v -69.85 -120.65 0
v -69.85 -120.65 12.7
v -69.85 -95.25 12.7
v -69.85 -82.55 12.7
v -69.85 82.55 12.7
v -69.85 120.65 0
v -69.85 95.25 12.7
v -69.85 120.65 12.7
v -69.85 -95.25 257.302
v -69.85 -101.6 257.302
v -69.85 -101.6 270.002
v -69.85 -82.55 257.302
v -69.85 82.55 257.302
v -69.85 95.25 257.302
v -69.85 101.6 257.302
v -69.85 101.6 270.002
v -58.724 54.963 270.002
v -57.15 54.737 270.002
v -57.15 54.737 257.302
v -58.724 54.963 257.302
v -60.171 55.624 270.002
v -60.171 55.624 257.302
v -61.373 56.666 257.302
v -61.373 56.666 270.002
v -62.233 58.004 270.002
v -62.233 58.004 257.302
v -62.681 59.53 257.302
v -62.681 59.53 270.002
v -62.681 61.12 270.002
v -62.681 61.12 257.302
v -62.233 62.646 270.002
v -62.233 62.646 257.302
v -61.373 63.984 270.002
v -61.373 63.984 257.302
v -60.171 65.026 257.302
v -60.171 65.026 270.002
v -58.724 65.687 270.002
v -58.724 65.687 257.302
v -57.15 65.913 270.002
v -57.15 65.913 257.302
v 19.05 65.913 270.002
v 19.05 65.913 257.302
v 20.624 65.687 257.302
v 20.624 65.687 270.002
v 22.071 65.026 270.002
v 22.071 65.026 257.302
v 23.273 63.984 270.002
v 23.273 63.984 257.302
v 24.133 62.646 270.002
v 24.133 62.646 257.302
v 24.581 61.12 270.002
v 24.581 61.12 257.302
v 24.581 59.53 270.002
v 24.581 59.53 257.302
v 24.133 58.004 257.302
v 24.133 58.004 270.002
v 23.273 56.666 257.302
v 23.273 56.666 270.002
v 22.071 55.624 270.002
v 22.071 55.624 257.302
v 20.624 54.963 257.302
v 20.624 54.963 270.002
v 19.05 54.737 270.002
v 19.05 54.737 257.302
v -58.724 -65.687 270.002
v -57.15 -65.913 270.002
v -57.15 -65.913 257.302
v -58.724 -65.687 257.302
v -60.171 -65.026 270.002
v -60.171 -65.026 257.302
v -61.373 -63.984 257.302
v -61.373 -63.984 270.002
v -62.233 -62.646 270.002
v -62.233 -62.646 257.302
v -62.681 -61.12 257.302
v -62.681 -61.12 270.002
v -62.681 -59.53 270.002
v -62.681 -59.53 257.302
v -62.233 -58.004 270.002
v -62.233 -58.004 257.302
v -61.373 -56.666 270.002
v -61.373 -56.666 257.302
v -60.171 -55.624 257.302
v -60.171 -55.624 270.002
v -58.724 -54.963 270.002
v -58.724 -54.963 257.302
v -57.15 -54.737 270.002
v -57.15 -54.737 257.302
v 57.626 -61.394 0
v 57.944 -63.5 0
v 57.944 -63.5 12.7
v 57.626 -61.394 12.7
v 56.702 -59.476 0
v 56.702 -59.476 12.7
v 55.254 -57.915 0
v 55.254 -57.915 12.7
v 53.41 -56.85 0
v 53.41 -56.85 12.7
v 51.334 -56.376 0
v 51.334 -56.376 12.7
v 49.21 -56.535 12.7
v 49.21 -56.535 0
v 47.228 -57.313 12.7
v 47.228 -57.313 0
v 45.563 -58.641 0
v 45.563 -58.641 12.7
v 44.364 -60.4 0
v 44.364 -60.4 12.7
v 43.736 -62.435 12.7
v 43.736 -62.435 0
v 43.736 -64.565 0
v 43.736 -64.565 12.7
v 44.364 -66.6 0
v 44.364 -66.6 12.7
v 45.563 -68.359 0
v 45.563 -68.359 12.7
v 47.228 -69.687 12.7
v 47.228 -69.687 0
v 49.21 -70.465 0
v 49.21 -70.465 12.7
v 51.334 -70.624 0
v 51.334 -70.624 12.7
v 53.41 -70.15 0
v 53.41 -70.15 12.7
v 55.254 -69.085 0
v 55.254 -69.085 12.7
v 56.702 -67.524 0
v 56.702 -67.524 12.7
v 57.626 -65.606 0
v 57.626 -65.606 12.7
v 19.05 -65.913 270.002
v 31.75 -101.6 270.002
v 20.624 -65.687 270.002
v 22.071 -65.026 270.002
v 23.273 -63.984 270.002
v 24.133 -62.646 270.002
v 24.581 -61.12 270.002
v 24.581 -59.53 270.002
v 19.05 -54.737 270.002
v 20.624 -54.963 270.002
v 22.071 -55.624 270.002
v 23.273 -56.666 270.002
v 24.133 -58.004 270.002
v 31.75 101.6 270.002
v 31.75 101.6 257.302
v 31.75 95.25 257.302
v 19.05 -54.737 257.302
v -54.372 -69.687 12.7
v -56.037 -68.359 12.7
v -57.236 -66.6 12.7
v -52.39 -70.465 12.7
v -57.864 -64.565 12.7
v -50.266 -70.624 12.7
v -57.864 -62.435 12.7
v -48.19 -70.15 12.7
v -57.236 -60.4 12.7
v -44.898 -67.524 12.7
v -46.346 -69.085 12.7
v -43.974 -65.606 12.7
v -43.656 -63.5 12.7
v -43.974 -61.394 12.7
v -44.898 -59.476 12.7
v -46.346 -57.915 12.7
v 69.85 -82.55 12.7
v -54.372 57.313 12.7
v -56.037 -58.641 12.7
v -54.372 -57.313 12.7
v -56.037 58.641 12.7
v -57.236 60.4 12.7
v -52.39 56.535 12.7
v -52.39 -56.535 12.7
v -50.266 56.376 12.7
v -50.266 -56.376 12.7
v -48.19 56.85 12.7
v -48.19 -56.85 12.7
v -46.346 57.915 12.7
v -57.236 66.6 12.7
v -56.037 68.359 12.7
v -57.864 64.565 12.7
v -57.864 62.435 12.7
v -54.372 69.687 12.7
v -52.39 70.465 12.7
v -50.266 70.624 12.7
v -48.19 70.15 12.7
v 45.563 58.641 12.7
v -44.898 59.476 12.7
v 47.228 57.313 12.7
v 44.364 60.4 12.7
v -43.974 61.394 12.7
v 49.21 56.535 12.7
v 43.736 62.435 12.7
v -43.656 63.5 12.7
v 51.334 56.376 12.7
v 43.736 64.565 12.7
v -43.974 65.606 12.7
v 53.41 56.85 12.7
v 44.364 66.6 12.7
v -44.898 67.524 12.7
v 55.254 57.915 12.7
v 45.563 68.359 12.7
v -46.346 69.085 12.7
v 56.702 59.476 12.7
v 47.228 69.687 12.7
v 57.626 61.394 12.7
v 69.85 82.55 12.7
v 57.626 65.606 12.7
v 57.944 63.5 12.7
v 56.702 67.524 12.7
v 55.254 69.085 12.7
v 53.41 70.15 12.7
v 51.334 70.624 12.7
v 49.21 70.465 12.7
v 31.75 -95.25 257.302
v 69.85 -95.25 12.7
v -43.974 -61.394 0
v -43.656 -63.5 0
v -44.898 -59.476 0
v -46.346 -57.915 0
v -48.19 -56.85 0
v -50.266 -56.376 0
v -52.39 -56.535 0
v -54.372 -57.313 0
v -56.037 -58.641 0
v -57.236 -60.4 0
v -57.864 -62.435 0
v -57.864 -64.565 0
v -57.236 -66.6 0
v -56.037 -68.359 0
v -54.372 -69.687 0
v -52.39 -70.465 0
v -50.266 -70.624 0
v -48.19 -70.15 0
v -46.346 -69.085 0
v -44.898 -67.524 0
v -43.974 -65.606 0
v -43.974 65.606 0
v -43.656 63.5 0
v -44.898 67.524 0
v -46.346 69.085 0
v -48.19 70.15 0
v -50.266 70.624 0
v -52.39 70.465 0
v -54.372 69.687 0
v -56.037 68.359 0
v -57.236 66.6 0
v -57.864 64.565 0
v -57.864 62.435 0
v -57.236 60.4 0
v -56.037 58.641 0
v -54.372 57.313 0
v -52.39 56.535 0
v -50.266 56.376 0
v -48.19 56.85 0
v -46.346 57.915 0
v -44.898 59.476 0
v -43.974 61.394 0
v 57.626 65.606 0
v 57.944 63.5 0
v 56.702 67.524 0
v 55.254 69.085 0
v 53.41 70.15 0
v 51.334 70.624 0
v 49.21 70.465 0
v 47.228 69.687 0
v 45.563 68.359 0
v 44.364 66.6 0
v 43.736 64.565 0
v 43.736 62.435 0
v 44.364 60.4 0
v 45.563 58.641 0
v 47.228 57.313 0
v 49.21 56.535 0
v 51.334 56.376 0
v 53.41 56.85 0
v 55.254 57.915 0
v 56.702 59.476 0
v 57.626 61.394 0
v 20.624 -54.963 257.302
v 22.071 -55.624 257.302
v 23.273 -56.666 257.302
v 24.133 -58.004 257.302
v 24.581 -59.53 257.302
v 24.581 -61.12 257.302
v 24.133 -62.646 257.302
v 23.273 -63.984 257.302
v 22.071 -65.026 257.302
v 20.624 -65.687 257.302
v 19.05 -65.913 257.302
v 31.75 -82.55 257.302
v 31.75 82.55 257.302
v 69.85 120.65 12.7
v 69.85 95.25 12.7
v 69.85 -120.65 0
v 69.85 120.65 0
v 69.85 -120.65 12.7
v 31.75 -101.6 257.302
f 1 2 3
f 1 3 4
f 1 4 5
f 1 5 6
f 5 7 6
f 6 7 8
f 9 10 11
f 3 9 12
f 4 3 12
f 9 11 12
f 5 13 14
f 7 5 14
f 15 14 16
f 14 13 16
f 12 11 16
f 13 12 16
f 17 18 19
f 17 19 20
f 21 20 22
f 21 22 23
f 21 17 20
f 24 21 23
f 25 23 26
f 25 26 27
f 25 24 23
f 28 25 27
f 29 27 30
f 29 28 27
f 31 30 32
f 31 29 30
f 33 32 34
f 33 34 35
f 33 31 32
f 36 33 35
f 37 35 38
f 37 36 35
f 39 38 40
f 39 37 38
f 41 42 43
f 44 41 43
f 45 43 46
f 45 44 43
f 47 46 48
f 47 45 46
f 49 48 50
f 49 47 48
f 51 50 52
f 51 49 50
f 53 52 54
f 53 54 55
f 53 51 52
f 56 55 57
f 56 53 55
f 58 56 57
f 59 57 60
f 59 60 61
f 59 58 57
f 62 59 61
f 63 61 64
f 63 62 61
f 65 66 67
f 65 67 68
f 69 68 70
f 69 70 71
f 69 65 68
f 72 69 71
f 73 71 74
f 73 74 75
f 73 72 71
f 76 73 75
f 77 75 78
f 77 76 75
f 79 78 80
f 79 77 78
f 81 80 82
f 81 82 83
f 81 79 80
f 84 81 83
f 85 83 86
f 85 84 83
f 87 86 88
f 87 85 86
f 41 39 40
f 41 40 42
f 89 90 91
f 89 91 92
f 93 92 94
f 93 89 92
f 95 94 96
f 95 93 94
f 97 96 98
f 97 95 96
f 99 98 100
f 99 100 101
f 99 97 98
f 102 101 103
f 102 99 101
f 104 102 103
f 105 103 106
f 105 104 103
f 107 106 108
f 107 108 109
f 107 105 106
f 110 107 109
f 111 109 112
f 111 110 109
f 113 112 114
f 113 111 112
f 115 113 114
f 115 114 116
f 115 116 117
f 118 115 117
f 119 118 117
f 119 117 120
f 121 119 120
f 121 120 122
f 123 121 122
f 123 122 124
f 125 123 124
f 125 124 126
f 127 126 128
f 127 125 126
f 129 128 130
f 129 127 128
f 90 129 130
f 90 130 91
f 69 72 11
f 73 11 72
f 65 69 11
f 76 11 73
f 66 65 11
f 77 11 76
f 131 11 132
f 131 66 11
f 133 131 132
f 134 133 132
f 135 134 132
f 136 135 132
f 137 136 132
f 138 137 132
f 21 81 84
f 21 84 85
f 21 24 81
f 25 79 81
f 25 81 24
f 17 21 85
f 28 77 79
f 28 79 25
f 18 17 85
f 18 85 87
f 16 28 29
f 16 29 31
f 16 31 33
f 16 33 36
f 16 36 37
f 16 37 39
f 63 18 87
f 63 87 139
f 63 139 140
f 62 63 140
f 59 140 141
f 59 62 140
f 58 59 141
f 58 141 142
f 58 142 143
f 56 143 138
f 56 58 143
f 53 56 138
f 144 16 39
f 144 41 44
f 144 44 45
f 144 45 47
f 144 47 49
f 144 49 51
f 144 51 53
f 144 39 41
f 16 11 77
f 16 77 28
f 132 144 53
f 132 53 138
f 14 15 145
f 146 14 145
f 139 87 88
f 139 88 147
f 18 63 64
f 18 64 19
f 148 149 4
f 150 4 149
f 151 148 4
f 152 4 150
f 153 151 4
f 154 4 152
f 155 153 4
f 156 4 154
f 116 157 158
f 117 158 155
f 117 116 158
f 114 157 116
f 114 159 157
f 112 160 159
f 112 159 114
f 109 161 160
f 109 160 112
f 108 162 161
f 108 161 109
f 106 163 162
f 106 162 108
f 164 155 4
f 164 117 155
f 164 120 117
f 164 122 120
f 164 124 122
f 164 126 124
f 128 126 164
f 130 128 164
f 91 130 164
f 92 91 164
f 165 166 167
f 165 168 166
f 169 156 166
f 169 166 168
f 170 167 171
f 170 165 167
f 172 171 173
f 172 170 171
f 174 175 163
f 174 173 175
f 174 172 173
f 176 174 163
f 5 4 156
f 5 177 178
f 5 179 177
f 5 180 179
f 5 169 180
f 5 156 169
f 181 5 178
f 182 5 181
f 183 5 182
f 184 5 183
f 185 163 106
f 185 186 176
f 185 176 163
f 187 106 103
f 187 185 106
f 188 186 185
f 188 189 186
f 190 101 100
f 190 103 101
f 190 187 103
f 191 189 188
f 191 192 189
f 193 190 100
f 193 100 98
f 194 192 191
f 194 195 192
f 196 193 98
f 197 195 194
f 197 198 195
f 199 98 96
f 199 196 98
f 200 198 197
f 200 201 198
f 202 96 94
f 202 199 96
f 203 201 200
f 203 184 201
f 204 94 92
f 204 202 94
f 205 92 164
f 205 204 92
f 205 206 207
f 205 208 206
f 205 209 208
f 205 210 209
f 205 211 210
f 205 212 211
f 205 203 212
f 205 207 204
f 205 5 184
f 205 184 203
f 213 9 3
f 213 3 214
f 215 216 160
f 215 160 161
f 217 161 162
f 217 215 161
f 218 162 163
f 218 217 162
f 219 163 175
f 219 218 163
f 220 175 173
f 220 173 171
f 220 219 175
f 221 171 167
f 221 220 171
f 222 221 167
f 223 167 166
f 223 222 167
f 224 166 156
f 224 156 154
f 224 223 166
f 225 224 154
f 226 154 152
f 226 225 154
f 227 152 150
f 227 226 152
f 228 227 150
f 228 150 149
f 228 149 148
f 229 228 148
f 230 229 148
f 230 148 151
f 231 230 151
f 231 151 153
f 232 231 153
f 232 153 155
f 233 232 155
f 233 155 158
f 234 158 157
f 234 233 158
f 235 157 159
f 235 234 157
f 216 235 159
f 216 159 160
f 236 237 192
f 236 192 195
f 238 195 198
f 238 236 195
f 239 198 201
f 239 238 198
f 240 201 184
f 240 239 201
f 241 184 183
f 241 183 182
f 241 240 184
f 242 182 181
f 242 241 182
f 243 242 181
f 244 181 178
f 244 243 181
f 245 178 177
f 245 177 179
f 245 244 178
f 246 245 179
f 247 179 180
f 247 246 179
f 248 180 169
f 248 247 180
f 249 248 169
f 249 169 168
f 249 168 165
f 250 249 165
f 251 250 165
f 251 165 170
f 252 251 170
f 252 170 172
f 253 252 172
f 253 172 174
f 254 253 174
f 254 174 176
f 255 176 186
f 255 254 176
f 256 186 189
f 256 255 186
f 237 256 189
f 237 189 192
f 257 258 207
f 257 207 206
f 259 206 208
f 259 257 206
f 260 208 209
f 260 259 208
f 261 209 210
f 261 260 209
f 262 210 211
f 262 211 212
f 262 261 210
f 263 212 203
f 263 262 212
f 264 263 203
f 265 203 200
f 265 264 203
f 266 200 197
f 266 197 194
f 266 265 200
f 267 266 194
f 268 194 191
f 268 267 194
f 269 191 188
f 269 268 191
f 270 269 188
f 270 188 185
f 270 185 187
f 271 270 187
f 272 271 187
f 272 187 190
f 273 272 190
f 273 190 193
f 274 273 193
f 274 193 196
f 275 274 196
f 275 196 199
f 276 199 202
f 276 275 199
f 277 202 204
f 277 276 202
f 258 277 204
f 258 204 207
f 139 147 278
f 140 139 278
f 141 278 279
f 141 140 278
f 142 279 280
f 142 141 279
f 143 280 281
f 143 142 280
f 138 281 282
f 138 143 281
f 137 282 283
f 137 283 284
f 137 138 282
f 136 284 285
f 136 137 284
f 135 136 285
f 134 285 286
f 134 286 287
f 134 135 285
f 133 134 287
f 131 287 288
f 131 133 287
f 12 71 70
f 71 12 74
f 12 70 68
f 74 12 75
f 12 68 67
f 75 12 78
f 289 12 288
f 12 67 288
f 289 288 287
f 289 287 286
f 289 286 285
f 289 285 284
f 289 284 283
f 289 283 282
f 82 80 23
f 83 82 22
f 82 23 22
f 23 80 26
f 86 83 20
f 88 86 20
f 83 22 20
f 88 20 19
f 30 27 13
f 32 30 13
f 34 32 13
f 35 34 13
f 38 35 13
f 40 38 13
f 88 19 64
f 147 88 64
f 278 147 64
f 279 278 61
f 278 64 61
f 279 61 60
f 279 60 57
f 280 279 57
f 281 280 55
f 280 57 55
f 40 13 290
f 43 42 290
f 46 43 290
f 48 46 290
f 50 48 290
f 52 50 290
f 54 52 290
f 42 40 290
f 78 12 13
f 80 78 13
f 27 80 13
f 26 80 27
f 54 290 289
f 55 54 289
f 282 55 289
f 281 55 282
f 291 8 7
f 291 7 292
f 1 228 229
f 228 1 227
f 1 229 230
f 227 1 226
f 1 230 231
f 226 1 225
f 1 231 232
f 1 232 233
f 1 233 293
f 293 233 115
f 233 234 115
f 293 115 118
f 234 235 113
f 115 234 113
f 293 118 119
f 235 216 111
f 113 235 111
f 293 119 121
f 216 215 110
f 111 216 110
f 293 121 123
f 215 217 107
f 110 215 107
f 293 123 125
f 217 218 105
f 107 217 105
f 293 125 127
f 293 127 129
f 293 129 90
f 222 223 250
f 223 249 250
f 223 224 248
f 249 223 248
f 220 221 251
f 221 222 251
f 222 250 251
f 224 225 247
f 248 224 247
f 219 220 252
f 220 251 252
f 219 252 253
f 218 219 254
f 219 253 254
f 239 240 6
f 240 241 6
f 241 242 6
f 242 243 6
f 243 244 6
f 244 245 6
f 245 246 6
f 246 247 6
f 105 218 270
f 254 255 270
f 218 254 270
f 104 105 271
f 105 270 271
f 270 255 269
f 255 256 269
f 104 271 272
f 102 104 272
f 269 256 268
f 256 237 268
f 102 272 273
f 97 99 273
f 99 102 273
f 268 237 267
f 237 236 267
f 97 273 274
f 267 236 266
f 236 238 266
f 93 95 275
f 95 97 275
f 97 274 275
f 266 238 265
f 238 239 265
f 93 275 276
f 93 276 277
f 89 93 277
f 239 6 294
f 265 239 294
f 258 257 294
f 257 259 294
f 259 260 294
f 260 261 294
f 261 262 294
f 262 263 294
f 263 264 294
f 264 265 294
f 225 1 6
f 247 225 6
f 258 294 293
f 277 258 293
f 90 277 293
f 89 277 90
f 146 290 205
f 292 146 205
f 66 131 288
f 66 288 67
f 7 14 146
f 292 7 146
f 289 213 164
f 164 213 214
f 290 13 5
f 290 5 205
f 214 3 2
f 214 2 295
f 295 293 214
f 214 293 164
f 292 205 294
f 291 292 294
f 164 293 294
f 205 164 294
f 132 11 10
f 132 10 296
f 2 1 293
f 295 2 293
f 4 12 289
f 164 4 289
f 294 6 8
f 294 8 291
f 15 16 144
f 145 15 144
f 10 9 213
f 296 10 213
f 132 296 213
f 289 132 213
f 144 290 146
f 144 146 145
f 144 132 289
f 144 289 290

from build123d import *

# Parameters (mm, degrees)
F0_W     = 139.7
F0_H     = 241.3
F0_R     = 7.14375
F1_DEPTH = 12.7
F3_W     = 101.6
F3_H     = 203.2
F4_DEPTH = 12.7
F5_W     = 139.7
F5_H     = 12.7
F6_DEPTH = 244.602
F9_DEPTH = 215.901


with BuildPart() as f1:
    # F0 (on Top) → F1 (new body)
    with BuildSketch(Plane.XY):
        Rectangle(F0_W, F0_H)
        with Locations((-50.8, -63.5)):
            Circle(F0_R, mode=Mode.SUBTRACT)
        with Locations((50.8, -63.5)):
            Circle(F0_R, mode=Mode.SUBTRACT)
        with Locations((-50.8, 63.5)):
            Circle(F0_R, mode=Mode.SUBTRACT)
        with Locations((50.8, 63.5)):
            Circle(F0_R, mode=Mode.SUBTRACT)
    extrude(amount=F1_DEPTH)


with BuildPart() as f4:
    # F3 (on offset) → F4 (new body)
    with BuildSketch(Plane.XY.offset(270.002)):
        with Locations((-19.05, 0)):
            Rectangle(F3_W, F3_H)
        with BuildLine():
            ThreePointArc((-57.15, -65.913), (-62.738, -60.325), (-57.15, -54.737))
            Line((-57.15, -54.737), (19.05, -54.737))
            ThreePointArc((19.05, -54.737), (24.638, -60.325), (19.05, -65.913))
            Line((19.05, -65.913), (-57.15, -65.913))
        make_face(mode=Mode.SUBTRACT)
        with BuildLine():
            Line((19.05, 54.737), (-57.15, 54.737))
            ThreePointArc((-57.15, 54.737), (-62.738, 60.325), (-57.15, 65.913))
            Line((-57.15, 65.913), (19.05, 65.913))
            ThreePointArc((19.05, 65.913), (24.638, 60.325), (19.05, 54.737))
        make_face(mode=Mode.SUBTRACT)
    extrude(amount=-F4_DEPTH)


with BuildPart() as f6:
    # F5 (on face) → F6 (new body, through all)
    with BuildSketch(Plane.XY.offset(12.7)):
        with Locations((0, 88.9)):
            Rectangle(F5_W, F5_H)
    extrude(amount=F6_DEPTH)


with BuildPart() as f6b:
    # F5 (on face) → F6, piece 2 (new body, through all)
    with BuildSketch(Plane.XY.offset(12.7)):
        with Locations((0, -88.9)):
            Rectangle(F5_W, F5_H)
    extrude(amount=F6_DEPTH)


with BuildPart() as f1_1:
    add(f1.part)

    # F7: union F6b, F6, F4
    add(f6b.part)
    add(f6.part)
    add(f4.part)

    # F8 (on face) → F9 (cut, through all)
    with BuildSketch(Plane.XZ.offset(95.25)):
        Polygon((69.85, 257.302), (31.75, 257.302), (69.85, 12.7), align=None)
    extrude(amount=-F9_DEPTH, mode=Mode.SUBTRACT)


solid = f1_1.part
